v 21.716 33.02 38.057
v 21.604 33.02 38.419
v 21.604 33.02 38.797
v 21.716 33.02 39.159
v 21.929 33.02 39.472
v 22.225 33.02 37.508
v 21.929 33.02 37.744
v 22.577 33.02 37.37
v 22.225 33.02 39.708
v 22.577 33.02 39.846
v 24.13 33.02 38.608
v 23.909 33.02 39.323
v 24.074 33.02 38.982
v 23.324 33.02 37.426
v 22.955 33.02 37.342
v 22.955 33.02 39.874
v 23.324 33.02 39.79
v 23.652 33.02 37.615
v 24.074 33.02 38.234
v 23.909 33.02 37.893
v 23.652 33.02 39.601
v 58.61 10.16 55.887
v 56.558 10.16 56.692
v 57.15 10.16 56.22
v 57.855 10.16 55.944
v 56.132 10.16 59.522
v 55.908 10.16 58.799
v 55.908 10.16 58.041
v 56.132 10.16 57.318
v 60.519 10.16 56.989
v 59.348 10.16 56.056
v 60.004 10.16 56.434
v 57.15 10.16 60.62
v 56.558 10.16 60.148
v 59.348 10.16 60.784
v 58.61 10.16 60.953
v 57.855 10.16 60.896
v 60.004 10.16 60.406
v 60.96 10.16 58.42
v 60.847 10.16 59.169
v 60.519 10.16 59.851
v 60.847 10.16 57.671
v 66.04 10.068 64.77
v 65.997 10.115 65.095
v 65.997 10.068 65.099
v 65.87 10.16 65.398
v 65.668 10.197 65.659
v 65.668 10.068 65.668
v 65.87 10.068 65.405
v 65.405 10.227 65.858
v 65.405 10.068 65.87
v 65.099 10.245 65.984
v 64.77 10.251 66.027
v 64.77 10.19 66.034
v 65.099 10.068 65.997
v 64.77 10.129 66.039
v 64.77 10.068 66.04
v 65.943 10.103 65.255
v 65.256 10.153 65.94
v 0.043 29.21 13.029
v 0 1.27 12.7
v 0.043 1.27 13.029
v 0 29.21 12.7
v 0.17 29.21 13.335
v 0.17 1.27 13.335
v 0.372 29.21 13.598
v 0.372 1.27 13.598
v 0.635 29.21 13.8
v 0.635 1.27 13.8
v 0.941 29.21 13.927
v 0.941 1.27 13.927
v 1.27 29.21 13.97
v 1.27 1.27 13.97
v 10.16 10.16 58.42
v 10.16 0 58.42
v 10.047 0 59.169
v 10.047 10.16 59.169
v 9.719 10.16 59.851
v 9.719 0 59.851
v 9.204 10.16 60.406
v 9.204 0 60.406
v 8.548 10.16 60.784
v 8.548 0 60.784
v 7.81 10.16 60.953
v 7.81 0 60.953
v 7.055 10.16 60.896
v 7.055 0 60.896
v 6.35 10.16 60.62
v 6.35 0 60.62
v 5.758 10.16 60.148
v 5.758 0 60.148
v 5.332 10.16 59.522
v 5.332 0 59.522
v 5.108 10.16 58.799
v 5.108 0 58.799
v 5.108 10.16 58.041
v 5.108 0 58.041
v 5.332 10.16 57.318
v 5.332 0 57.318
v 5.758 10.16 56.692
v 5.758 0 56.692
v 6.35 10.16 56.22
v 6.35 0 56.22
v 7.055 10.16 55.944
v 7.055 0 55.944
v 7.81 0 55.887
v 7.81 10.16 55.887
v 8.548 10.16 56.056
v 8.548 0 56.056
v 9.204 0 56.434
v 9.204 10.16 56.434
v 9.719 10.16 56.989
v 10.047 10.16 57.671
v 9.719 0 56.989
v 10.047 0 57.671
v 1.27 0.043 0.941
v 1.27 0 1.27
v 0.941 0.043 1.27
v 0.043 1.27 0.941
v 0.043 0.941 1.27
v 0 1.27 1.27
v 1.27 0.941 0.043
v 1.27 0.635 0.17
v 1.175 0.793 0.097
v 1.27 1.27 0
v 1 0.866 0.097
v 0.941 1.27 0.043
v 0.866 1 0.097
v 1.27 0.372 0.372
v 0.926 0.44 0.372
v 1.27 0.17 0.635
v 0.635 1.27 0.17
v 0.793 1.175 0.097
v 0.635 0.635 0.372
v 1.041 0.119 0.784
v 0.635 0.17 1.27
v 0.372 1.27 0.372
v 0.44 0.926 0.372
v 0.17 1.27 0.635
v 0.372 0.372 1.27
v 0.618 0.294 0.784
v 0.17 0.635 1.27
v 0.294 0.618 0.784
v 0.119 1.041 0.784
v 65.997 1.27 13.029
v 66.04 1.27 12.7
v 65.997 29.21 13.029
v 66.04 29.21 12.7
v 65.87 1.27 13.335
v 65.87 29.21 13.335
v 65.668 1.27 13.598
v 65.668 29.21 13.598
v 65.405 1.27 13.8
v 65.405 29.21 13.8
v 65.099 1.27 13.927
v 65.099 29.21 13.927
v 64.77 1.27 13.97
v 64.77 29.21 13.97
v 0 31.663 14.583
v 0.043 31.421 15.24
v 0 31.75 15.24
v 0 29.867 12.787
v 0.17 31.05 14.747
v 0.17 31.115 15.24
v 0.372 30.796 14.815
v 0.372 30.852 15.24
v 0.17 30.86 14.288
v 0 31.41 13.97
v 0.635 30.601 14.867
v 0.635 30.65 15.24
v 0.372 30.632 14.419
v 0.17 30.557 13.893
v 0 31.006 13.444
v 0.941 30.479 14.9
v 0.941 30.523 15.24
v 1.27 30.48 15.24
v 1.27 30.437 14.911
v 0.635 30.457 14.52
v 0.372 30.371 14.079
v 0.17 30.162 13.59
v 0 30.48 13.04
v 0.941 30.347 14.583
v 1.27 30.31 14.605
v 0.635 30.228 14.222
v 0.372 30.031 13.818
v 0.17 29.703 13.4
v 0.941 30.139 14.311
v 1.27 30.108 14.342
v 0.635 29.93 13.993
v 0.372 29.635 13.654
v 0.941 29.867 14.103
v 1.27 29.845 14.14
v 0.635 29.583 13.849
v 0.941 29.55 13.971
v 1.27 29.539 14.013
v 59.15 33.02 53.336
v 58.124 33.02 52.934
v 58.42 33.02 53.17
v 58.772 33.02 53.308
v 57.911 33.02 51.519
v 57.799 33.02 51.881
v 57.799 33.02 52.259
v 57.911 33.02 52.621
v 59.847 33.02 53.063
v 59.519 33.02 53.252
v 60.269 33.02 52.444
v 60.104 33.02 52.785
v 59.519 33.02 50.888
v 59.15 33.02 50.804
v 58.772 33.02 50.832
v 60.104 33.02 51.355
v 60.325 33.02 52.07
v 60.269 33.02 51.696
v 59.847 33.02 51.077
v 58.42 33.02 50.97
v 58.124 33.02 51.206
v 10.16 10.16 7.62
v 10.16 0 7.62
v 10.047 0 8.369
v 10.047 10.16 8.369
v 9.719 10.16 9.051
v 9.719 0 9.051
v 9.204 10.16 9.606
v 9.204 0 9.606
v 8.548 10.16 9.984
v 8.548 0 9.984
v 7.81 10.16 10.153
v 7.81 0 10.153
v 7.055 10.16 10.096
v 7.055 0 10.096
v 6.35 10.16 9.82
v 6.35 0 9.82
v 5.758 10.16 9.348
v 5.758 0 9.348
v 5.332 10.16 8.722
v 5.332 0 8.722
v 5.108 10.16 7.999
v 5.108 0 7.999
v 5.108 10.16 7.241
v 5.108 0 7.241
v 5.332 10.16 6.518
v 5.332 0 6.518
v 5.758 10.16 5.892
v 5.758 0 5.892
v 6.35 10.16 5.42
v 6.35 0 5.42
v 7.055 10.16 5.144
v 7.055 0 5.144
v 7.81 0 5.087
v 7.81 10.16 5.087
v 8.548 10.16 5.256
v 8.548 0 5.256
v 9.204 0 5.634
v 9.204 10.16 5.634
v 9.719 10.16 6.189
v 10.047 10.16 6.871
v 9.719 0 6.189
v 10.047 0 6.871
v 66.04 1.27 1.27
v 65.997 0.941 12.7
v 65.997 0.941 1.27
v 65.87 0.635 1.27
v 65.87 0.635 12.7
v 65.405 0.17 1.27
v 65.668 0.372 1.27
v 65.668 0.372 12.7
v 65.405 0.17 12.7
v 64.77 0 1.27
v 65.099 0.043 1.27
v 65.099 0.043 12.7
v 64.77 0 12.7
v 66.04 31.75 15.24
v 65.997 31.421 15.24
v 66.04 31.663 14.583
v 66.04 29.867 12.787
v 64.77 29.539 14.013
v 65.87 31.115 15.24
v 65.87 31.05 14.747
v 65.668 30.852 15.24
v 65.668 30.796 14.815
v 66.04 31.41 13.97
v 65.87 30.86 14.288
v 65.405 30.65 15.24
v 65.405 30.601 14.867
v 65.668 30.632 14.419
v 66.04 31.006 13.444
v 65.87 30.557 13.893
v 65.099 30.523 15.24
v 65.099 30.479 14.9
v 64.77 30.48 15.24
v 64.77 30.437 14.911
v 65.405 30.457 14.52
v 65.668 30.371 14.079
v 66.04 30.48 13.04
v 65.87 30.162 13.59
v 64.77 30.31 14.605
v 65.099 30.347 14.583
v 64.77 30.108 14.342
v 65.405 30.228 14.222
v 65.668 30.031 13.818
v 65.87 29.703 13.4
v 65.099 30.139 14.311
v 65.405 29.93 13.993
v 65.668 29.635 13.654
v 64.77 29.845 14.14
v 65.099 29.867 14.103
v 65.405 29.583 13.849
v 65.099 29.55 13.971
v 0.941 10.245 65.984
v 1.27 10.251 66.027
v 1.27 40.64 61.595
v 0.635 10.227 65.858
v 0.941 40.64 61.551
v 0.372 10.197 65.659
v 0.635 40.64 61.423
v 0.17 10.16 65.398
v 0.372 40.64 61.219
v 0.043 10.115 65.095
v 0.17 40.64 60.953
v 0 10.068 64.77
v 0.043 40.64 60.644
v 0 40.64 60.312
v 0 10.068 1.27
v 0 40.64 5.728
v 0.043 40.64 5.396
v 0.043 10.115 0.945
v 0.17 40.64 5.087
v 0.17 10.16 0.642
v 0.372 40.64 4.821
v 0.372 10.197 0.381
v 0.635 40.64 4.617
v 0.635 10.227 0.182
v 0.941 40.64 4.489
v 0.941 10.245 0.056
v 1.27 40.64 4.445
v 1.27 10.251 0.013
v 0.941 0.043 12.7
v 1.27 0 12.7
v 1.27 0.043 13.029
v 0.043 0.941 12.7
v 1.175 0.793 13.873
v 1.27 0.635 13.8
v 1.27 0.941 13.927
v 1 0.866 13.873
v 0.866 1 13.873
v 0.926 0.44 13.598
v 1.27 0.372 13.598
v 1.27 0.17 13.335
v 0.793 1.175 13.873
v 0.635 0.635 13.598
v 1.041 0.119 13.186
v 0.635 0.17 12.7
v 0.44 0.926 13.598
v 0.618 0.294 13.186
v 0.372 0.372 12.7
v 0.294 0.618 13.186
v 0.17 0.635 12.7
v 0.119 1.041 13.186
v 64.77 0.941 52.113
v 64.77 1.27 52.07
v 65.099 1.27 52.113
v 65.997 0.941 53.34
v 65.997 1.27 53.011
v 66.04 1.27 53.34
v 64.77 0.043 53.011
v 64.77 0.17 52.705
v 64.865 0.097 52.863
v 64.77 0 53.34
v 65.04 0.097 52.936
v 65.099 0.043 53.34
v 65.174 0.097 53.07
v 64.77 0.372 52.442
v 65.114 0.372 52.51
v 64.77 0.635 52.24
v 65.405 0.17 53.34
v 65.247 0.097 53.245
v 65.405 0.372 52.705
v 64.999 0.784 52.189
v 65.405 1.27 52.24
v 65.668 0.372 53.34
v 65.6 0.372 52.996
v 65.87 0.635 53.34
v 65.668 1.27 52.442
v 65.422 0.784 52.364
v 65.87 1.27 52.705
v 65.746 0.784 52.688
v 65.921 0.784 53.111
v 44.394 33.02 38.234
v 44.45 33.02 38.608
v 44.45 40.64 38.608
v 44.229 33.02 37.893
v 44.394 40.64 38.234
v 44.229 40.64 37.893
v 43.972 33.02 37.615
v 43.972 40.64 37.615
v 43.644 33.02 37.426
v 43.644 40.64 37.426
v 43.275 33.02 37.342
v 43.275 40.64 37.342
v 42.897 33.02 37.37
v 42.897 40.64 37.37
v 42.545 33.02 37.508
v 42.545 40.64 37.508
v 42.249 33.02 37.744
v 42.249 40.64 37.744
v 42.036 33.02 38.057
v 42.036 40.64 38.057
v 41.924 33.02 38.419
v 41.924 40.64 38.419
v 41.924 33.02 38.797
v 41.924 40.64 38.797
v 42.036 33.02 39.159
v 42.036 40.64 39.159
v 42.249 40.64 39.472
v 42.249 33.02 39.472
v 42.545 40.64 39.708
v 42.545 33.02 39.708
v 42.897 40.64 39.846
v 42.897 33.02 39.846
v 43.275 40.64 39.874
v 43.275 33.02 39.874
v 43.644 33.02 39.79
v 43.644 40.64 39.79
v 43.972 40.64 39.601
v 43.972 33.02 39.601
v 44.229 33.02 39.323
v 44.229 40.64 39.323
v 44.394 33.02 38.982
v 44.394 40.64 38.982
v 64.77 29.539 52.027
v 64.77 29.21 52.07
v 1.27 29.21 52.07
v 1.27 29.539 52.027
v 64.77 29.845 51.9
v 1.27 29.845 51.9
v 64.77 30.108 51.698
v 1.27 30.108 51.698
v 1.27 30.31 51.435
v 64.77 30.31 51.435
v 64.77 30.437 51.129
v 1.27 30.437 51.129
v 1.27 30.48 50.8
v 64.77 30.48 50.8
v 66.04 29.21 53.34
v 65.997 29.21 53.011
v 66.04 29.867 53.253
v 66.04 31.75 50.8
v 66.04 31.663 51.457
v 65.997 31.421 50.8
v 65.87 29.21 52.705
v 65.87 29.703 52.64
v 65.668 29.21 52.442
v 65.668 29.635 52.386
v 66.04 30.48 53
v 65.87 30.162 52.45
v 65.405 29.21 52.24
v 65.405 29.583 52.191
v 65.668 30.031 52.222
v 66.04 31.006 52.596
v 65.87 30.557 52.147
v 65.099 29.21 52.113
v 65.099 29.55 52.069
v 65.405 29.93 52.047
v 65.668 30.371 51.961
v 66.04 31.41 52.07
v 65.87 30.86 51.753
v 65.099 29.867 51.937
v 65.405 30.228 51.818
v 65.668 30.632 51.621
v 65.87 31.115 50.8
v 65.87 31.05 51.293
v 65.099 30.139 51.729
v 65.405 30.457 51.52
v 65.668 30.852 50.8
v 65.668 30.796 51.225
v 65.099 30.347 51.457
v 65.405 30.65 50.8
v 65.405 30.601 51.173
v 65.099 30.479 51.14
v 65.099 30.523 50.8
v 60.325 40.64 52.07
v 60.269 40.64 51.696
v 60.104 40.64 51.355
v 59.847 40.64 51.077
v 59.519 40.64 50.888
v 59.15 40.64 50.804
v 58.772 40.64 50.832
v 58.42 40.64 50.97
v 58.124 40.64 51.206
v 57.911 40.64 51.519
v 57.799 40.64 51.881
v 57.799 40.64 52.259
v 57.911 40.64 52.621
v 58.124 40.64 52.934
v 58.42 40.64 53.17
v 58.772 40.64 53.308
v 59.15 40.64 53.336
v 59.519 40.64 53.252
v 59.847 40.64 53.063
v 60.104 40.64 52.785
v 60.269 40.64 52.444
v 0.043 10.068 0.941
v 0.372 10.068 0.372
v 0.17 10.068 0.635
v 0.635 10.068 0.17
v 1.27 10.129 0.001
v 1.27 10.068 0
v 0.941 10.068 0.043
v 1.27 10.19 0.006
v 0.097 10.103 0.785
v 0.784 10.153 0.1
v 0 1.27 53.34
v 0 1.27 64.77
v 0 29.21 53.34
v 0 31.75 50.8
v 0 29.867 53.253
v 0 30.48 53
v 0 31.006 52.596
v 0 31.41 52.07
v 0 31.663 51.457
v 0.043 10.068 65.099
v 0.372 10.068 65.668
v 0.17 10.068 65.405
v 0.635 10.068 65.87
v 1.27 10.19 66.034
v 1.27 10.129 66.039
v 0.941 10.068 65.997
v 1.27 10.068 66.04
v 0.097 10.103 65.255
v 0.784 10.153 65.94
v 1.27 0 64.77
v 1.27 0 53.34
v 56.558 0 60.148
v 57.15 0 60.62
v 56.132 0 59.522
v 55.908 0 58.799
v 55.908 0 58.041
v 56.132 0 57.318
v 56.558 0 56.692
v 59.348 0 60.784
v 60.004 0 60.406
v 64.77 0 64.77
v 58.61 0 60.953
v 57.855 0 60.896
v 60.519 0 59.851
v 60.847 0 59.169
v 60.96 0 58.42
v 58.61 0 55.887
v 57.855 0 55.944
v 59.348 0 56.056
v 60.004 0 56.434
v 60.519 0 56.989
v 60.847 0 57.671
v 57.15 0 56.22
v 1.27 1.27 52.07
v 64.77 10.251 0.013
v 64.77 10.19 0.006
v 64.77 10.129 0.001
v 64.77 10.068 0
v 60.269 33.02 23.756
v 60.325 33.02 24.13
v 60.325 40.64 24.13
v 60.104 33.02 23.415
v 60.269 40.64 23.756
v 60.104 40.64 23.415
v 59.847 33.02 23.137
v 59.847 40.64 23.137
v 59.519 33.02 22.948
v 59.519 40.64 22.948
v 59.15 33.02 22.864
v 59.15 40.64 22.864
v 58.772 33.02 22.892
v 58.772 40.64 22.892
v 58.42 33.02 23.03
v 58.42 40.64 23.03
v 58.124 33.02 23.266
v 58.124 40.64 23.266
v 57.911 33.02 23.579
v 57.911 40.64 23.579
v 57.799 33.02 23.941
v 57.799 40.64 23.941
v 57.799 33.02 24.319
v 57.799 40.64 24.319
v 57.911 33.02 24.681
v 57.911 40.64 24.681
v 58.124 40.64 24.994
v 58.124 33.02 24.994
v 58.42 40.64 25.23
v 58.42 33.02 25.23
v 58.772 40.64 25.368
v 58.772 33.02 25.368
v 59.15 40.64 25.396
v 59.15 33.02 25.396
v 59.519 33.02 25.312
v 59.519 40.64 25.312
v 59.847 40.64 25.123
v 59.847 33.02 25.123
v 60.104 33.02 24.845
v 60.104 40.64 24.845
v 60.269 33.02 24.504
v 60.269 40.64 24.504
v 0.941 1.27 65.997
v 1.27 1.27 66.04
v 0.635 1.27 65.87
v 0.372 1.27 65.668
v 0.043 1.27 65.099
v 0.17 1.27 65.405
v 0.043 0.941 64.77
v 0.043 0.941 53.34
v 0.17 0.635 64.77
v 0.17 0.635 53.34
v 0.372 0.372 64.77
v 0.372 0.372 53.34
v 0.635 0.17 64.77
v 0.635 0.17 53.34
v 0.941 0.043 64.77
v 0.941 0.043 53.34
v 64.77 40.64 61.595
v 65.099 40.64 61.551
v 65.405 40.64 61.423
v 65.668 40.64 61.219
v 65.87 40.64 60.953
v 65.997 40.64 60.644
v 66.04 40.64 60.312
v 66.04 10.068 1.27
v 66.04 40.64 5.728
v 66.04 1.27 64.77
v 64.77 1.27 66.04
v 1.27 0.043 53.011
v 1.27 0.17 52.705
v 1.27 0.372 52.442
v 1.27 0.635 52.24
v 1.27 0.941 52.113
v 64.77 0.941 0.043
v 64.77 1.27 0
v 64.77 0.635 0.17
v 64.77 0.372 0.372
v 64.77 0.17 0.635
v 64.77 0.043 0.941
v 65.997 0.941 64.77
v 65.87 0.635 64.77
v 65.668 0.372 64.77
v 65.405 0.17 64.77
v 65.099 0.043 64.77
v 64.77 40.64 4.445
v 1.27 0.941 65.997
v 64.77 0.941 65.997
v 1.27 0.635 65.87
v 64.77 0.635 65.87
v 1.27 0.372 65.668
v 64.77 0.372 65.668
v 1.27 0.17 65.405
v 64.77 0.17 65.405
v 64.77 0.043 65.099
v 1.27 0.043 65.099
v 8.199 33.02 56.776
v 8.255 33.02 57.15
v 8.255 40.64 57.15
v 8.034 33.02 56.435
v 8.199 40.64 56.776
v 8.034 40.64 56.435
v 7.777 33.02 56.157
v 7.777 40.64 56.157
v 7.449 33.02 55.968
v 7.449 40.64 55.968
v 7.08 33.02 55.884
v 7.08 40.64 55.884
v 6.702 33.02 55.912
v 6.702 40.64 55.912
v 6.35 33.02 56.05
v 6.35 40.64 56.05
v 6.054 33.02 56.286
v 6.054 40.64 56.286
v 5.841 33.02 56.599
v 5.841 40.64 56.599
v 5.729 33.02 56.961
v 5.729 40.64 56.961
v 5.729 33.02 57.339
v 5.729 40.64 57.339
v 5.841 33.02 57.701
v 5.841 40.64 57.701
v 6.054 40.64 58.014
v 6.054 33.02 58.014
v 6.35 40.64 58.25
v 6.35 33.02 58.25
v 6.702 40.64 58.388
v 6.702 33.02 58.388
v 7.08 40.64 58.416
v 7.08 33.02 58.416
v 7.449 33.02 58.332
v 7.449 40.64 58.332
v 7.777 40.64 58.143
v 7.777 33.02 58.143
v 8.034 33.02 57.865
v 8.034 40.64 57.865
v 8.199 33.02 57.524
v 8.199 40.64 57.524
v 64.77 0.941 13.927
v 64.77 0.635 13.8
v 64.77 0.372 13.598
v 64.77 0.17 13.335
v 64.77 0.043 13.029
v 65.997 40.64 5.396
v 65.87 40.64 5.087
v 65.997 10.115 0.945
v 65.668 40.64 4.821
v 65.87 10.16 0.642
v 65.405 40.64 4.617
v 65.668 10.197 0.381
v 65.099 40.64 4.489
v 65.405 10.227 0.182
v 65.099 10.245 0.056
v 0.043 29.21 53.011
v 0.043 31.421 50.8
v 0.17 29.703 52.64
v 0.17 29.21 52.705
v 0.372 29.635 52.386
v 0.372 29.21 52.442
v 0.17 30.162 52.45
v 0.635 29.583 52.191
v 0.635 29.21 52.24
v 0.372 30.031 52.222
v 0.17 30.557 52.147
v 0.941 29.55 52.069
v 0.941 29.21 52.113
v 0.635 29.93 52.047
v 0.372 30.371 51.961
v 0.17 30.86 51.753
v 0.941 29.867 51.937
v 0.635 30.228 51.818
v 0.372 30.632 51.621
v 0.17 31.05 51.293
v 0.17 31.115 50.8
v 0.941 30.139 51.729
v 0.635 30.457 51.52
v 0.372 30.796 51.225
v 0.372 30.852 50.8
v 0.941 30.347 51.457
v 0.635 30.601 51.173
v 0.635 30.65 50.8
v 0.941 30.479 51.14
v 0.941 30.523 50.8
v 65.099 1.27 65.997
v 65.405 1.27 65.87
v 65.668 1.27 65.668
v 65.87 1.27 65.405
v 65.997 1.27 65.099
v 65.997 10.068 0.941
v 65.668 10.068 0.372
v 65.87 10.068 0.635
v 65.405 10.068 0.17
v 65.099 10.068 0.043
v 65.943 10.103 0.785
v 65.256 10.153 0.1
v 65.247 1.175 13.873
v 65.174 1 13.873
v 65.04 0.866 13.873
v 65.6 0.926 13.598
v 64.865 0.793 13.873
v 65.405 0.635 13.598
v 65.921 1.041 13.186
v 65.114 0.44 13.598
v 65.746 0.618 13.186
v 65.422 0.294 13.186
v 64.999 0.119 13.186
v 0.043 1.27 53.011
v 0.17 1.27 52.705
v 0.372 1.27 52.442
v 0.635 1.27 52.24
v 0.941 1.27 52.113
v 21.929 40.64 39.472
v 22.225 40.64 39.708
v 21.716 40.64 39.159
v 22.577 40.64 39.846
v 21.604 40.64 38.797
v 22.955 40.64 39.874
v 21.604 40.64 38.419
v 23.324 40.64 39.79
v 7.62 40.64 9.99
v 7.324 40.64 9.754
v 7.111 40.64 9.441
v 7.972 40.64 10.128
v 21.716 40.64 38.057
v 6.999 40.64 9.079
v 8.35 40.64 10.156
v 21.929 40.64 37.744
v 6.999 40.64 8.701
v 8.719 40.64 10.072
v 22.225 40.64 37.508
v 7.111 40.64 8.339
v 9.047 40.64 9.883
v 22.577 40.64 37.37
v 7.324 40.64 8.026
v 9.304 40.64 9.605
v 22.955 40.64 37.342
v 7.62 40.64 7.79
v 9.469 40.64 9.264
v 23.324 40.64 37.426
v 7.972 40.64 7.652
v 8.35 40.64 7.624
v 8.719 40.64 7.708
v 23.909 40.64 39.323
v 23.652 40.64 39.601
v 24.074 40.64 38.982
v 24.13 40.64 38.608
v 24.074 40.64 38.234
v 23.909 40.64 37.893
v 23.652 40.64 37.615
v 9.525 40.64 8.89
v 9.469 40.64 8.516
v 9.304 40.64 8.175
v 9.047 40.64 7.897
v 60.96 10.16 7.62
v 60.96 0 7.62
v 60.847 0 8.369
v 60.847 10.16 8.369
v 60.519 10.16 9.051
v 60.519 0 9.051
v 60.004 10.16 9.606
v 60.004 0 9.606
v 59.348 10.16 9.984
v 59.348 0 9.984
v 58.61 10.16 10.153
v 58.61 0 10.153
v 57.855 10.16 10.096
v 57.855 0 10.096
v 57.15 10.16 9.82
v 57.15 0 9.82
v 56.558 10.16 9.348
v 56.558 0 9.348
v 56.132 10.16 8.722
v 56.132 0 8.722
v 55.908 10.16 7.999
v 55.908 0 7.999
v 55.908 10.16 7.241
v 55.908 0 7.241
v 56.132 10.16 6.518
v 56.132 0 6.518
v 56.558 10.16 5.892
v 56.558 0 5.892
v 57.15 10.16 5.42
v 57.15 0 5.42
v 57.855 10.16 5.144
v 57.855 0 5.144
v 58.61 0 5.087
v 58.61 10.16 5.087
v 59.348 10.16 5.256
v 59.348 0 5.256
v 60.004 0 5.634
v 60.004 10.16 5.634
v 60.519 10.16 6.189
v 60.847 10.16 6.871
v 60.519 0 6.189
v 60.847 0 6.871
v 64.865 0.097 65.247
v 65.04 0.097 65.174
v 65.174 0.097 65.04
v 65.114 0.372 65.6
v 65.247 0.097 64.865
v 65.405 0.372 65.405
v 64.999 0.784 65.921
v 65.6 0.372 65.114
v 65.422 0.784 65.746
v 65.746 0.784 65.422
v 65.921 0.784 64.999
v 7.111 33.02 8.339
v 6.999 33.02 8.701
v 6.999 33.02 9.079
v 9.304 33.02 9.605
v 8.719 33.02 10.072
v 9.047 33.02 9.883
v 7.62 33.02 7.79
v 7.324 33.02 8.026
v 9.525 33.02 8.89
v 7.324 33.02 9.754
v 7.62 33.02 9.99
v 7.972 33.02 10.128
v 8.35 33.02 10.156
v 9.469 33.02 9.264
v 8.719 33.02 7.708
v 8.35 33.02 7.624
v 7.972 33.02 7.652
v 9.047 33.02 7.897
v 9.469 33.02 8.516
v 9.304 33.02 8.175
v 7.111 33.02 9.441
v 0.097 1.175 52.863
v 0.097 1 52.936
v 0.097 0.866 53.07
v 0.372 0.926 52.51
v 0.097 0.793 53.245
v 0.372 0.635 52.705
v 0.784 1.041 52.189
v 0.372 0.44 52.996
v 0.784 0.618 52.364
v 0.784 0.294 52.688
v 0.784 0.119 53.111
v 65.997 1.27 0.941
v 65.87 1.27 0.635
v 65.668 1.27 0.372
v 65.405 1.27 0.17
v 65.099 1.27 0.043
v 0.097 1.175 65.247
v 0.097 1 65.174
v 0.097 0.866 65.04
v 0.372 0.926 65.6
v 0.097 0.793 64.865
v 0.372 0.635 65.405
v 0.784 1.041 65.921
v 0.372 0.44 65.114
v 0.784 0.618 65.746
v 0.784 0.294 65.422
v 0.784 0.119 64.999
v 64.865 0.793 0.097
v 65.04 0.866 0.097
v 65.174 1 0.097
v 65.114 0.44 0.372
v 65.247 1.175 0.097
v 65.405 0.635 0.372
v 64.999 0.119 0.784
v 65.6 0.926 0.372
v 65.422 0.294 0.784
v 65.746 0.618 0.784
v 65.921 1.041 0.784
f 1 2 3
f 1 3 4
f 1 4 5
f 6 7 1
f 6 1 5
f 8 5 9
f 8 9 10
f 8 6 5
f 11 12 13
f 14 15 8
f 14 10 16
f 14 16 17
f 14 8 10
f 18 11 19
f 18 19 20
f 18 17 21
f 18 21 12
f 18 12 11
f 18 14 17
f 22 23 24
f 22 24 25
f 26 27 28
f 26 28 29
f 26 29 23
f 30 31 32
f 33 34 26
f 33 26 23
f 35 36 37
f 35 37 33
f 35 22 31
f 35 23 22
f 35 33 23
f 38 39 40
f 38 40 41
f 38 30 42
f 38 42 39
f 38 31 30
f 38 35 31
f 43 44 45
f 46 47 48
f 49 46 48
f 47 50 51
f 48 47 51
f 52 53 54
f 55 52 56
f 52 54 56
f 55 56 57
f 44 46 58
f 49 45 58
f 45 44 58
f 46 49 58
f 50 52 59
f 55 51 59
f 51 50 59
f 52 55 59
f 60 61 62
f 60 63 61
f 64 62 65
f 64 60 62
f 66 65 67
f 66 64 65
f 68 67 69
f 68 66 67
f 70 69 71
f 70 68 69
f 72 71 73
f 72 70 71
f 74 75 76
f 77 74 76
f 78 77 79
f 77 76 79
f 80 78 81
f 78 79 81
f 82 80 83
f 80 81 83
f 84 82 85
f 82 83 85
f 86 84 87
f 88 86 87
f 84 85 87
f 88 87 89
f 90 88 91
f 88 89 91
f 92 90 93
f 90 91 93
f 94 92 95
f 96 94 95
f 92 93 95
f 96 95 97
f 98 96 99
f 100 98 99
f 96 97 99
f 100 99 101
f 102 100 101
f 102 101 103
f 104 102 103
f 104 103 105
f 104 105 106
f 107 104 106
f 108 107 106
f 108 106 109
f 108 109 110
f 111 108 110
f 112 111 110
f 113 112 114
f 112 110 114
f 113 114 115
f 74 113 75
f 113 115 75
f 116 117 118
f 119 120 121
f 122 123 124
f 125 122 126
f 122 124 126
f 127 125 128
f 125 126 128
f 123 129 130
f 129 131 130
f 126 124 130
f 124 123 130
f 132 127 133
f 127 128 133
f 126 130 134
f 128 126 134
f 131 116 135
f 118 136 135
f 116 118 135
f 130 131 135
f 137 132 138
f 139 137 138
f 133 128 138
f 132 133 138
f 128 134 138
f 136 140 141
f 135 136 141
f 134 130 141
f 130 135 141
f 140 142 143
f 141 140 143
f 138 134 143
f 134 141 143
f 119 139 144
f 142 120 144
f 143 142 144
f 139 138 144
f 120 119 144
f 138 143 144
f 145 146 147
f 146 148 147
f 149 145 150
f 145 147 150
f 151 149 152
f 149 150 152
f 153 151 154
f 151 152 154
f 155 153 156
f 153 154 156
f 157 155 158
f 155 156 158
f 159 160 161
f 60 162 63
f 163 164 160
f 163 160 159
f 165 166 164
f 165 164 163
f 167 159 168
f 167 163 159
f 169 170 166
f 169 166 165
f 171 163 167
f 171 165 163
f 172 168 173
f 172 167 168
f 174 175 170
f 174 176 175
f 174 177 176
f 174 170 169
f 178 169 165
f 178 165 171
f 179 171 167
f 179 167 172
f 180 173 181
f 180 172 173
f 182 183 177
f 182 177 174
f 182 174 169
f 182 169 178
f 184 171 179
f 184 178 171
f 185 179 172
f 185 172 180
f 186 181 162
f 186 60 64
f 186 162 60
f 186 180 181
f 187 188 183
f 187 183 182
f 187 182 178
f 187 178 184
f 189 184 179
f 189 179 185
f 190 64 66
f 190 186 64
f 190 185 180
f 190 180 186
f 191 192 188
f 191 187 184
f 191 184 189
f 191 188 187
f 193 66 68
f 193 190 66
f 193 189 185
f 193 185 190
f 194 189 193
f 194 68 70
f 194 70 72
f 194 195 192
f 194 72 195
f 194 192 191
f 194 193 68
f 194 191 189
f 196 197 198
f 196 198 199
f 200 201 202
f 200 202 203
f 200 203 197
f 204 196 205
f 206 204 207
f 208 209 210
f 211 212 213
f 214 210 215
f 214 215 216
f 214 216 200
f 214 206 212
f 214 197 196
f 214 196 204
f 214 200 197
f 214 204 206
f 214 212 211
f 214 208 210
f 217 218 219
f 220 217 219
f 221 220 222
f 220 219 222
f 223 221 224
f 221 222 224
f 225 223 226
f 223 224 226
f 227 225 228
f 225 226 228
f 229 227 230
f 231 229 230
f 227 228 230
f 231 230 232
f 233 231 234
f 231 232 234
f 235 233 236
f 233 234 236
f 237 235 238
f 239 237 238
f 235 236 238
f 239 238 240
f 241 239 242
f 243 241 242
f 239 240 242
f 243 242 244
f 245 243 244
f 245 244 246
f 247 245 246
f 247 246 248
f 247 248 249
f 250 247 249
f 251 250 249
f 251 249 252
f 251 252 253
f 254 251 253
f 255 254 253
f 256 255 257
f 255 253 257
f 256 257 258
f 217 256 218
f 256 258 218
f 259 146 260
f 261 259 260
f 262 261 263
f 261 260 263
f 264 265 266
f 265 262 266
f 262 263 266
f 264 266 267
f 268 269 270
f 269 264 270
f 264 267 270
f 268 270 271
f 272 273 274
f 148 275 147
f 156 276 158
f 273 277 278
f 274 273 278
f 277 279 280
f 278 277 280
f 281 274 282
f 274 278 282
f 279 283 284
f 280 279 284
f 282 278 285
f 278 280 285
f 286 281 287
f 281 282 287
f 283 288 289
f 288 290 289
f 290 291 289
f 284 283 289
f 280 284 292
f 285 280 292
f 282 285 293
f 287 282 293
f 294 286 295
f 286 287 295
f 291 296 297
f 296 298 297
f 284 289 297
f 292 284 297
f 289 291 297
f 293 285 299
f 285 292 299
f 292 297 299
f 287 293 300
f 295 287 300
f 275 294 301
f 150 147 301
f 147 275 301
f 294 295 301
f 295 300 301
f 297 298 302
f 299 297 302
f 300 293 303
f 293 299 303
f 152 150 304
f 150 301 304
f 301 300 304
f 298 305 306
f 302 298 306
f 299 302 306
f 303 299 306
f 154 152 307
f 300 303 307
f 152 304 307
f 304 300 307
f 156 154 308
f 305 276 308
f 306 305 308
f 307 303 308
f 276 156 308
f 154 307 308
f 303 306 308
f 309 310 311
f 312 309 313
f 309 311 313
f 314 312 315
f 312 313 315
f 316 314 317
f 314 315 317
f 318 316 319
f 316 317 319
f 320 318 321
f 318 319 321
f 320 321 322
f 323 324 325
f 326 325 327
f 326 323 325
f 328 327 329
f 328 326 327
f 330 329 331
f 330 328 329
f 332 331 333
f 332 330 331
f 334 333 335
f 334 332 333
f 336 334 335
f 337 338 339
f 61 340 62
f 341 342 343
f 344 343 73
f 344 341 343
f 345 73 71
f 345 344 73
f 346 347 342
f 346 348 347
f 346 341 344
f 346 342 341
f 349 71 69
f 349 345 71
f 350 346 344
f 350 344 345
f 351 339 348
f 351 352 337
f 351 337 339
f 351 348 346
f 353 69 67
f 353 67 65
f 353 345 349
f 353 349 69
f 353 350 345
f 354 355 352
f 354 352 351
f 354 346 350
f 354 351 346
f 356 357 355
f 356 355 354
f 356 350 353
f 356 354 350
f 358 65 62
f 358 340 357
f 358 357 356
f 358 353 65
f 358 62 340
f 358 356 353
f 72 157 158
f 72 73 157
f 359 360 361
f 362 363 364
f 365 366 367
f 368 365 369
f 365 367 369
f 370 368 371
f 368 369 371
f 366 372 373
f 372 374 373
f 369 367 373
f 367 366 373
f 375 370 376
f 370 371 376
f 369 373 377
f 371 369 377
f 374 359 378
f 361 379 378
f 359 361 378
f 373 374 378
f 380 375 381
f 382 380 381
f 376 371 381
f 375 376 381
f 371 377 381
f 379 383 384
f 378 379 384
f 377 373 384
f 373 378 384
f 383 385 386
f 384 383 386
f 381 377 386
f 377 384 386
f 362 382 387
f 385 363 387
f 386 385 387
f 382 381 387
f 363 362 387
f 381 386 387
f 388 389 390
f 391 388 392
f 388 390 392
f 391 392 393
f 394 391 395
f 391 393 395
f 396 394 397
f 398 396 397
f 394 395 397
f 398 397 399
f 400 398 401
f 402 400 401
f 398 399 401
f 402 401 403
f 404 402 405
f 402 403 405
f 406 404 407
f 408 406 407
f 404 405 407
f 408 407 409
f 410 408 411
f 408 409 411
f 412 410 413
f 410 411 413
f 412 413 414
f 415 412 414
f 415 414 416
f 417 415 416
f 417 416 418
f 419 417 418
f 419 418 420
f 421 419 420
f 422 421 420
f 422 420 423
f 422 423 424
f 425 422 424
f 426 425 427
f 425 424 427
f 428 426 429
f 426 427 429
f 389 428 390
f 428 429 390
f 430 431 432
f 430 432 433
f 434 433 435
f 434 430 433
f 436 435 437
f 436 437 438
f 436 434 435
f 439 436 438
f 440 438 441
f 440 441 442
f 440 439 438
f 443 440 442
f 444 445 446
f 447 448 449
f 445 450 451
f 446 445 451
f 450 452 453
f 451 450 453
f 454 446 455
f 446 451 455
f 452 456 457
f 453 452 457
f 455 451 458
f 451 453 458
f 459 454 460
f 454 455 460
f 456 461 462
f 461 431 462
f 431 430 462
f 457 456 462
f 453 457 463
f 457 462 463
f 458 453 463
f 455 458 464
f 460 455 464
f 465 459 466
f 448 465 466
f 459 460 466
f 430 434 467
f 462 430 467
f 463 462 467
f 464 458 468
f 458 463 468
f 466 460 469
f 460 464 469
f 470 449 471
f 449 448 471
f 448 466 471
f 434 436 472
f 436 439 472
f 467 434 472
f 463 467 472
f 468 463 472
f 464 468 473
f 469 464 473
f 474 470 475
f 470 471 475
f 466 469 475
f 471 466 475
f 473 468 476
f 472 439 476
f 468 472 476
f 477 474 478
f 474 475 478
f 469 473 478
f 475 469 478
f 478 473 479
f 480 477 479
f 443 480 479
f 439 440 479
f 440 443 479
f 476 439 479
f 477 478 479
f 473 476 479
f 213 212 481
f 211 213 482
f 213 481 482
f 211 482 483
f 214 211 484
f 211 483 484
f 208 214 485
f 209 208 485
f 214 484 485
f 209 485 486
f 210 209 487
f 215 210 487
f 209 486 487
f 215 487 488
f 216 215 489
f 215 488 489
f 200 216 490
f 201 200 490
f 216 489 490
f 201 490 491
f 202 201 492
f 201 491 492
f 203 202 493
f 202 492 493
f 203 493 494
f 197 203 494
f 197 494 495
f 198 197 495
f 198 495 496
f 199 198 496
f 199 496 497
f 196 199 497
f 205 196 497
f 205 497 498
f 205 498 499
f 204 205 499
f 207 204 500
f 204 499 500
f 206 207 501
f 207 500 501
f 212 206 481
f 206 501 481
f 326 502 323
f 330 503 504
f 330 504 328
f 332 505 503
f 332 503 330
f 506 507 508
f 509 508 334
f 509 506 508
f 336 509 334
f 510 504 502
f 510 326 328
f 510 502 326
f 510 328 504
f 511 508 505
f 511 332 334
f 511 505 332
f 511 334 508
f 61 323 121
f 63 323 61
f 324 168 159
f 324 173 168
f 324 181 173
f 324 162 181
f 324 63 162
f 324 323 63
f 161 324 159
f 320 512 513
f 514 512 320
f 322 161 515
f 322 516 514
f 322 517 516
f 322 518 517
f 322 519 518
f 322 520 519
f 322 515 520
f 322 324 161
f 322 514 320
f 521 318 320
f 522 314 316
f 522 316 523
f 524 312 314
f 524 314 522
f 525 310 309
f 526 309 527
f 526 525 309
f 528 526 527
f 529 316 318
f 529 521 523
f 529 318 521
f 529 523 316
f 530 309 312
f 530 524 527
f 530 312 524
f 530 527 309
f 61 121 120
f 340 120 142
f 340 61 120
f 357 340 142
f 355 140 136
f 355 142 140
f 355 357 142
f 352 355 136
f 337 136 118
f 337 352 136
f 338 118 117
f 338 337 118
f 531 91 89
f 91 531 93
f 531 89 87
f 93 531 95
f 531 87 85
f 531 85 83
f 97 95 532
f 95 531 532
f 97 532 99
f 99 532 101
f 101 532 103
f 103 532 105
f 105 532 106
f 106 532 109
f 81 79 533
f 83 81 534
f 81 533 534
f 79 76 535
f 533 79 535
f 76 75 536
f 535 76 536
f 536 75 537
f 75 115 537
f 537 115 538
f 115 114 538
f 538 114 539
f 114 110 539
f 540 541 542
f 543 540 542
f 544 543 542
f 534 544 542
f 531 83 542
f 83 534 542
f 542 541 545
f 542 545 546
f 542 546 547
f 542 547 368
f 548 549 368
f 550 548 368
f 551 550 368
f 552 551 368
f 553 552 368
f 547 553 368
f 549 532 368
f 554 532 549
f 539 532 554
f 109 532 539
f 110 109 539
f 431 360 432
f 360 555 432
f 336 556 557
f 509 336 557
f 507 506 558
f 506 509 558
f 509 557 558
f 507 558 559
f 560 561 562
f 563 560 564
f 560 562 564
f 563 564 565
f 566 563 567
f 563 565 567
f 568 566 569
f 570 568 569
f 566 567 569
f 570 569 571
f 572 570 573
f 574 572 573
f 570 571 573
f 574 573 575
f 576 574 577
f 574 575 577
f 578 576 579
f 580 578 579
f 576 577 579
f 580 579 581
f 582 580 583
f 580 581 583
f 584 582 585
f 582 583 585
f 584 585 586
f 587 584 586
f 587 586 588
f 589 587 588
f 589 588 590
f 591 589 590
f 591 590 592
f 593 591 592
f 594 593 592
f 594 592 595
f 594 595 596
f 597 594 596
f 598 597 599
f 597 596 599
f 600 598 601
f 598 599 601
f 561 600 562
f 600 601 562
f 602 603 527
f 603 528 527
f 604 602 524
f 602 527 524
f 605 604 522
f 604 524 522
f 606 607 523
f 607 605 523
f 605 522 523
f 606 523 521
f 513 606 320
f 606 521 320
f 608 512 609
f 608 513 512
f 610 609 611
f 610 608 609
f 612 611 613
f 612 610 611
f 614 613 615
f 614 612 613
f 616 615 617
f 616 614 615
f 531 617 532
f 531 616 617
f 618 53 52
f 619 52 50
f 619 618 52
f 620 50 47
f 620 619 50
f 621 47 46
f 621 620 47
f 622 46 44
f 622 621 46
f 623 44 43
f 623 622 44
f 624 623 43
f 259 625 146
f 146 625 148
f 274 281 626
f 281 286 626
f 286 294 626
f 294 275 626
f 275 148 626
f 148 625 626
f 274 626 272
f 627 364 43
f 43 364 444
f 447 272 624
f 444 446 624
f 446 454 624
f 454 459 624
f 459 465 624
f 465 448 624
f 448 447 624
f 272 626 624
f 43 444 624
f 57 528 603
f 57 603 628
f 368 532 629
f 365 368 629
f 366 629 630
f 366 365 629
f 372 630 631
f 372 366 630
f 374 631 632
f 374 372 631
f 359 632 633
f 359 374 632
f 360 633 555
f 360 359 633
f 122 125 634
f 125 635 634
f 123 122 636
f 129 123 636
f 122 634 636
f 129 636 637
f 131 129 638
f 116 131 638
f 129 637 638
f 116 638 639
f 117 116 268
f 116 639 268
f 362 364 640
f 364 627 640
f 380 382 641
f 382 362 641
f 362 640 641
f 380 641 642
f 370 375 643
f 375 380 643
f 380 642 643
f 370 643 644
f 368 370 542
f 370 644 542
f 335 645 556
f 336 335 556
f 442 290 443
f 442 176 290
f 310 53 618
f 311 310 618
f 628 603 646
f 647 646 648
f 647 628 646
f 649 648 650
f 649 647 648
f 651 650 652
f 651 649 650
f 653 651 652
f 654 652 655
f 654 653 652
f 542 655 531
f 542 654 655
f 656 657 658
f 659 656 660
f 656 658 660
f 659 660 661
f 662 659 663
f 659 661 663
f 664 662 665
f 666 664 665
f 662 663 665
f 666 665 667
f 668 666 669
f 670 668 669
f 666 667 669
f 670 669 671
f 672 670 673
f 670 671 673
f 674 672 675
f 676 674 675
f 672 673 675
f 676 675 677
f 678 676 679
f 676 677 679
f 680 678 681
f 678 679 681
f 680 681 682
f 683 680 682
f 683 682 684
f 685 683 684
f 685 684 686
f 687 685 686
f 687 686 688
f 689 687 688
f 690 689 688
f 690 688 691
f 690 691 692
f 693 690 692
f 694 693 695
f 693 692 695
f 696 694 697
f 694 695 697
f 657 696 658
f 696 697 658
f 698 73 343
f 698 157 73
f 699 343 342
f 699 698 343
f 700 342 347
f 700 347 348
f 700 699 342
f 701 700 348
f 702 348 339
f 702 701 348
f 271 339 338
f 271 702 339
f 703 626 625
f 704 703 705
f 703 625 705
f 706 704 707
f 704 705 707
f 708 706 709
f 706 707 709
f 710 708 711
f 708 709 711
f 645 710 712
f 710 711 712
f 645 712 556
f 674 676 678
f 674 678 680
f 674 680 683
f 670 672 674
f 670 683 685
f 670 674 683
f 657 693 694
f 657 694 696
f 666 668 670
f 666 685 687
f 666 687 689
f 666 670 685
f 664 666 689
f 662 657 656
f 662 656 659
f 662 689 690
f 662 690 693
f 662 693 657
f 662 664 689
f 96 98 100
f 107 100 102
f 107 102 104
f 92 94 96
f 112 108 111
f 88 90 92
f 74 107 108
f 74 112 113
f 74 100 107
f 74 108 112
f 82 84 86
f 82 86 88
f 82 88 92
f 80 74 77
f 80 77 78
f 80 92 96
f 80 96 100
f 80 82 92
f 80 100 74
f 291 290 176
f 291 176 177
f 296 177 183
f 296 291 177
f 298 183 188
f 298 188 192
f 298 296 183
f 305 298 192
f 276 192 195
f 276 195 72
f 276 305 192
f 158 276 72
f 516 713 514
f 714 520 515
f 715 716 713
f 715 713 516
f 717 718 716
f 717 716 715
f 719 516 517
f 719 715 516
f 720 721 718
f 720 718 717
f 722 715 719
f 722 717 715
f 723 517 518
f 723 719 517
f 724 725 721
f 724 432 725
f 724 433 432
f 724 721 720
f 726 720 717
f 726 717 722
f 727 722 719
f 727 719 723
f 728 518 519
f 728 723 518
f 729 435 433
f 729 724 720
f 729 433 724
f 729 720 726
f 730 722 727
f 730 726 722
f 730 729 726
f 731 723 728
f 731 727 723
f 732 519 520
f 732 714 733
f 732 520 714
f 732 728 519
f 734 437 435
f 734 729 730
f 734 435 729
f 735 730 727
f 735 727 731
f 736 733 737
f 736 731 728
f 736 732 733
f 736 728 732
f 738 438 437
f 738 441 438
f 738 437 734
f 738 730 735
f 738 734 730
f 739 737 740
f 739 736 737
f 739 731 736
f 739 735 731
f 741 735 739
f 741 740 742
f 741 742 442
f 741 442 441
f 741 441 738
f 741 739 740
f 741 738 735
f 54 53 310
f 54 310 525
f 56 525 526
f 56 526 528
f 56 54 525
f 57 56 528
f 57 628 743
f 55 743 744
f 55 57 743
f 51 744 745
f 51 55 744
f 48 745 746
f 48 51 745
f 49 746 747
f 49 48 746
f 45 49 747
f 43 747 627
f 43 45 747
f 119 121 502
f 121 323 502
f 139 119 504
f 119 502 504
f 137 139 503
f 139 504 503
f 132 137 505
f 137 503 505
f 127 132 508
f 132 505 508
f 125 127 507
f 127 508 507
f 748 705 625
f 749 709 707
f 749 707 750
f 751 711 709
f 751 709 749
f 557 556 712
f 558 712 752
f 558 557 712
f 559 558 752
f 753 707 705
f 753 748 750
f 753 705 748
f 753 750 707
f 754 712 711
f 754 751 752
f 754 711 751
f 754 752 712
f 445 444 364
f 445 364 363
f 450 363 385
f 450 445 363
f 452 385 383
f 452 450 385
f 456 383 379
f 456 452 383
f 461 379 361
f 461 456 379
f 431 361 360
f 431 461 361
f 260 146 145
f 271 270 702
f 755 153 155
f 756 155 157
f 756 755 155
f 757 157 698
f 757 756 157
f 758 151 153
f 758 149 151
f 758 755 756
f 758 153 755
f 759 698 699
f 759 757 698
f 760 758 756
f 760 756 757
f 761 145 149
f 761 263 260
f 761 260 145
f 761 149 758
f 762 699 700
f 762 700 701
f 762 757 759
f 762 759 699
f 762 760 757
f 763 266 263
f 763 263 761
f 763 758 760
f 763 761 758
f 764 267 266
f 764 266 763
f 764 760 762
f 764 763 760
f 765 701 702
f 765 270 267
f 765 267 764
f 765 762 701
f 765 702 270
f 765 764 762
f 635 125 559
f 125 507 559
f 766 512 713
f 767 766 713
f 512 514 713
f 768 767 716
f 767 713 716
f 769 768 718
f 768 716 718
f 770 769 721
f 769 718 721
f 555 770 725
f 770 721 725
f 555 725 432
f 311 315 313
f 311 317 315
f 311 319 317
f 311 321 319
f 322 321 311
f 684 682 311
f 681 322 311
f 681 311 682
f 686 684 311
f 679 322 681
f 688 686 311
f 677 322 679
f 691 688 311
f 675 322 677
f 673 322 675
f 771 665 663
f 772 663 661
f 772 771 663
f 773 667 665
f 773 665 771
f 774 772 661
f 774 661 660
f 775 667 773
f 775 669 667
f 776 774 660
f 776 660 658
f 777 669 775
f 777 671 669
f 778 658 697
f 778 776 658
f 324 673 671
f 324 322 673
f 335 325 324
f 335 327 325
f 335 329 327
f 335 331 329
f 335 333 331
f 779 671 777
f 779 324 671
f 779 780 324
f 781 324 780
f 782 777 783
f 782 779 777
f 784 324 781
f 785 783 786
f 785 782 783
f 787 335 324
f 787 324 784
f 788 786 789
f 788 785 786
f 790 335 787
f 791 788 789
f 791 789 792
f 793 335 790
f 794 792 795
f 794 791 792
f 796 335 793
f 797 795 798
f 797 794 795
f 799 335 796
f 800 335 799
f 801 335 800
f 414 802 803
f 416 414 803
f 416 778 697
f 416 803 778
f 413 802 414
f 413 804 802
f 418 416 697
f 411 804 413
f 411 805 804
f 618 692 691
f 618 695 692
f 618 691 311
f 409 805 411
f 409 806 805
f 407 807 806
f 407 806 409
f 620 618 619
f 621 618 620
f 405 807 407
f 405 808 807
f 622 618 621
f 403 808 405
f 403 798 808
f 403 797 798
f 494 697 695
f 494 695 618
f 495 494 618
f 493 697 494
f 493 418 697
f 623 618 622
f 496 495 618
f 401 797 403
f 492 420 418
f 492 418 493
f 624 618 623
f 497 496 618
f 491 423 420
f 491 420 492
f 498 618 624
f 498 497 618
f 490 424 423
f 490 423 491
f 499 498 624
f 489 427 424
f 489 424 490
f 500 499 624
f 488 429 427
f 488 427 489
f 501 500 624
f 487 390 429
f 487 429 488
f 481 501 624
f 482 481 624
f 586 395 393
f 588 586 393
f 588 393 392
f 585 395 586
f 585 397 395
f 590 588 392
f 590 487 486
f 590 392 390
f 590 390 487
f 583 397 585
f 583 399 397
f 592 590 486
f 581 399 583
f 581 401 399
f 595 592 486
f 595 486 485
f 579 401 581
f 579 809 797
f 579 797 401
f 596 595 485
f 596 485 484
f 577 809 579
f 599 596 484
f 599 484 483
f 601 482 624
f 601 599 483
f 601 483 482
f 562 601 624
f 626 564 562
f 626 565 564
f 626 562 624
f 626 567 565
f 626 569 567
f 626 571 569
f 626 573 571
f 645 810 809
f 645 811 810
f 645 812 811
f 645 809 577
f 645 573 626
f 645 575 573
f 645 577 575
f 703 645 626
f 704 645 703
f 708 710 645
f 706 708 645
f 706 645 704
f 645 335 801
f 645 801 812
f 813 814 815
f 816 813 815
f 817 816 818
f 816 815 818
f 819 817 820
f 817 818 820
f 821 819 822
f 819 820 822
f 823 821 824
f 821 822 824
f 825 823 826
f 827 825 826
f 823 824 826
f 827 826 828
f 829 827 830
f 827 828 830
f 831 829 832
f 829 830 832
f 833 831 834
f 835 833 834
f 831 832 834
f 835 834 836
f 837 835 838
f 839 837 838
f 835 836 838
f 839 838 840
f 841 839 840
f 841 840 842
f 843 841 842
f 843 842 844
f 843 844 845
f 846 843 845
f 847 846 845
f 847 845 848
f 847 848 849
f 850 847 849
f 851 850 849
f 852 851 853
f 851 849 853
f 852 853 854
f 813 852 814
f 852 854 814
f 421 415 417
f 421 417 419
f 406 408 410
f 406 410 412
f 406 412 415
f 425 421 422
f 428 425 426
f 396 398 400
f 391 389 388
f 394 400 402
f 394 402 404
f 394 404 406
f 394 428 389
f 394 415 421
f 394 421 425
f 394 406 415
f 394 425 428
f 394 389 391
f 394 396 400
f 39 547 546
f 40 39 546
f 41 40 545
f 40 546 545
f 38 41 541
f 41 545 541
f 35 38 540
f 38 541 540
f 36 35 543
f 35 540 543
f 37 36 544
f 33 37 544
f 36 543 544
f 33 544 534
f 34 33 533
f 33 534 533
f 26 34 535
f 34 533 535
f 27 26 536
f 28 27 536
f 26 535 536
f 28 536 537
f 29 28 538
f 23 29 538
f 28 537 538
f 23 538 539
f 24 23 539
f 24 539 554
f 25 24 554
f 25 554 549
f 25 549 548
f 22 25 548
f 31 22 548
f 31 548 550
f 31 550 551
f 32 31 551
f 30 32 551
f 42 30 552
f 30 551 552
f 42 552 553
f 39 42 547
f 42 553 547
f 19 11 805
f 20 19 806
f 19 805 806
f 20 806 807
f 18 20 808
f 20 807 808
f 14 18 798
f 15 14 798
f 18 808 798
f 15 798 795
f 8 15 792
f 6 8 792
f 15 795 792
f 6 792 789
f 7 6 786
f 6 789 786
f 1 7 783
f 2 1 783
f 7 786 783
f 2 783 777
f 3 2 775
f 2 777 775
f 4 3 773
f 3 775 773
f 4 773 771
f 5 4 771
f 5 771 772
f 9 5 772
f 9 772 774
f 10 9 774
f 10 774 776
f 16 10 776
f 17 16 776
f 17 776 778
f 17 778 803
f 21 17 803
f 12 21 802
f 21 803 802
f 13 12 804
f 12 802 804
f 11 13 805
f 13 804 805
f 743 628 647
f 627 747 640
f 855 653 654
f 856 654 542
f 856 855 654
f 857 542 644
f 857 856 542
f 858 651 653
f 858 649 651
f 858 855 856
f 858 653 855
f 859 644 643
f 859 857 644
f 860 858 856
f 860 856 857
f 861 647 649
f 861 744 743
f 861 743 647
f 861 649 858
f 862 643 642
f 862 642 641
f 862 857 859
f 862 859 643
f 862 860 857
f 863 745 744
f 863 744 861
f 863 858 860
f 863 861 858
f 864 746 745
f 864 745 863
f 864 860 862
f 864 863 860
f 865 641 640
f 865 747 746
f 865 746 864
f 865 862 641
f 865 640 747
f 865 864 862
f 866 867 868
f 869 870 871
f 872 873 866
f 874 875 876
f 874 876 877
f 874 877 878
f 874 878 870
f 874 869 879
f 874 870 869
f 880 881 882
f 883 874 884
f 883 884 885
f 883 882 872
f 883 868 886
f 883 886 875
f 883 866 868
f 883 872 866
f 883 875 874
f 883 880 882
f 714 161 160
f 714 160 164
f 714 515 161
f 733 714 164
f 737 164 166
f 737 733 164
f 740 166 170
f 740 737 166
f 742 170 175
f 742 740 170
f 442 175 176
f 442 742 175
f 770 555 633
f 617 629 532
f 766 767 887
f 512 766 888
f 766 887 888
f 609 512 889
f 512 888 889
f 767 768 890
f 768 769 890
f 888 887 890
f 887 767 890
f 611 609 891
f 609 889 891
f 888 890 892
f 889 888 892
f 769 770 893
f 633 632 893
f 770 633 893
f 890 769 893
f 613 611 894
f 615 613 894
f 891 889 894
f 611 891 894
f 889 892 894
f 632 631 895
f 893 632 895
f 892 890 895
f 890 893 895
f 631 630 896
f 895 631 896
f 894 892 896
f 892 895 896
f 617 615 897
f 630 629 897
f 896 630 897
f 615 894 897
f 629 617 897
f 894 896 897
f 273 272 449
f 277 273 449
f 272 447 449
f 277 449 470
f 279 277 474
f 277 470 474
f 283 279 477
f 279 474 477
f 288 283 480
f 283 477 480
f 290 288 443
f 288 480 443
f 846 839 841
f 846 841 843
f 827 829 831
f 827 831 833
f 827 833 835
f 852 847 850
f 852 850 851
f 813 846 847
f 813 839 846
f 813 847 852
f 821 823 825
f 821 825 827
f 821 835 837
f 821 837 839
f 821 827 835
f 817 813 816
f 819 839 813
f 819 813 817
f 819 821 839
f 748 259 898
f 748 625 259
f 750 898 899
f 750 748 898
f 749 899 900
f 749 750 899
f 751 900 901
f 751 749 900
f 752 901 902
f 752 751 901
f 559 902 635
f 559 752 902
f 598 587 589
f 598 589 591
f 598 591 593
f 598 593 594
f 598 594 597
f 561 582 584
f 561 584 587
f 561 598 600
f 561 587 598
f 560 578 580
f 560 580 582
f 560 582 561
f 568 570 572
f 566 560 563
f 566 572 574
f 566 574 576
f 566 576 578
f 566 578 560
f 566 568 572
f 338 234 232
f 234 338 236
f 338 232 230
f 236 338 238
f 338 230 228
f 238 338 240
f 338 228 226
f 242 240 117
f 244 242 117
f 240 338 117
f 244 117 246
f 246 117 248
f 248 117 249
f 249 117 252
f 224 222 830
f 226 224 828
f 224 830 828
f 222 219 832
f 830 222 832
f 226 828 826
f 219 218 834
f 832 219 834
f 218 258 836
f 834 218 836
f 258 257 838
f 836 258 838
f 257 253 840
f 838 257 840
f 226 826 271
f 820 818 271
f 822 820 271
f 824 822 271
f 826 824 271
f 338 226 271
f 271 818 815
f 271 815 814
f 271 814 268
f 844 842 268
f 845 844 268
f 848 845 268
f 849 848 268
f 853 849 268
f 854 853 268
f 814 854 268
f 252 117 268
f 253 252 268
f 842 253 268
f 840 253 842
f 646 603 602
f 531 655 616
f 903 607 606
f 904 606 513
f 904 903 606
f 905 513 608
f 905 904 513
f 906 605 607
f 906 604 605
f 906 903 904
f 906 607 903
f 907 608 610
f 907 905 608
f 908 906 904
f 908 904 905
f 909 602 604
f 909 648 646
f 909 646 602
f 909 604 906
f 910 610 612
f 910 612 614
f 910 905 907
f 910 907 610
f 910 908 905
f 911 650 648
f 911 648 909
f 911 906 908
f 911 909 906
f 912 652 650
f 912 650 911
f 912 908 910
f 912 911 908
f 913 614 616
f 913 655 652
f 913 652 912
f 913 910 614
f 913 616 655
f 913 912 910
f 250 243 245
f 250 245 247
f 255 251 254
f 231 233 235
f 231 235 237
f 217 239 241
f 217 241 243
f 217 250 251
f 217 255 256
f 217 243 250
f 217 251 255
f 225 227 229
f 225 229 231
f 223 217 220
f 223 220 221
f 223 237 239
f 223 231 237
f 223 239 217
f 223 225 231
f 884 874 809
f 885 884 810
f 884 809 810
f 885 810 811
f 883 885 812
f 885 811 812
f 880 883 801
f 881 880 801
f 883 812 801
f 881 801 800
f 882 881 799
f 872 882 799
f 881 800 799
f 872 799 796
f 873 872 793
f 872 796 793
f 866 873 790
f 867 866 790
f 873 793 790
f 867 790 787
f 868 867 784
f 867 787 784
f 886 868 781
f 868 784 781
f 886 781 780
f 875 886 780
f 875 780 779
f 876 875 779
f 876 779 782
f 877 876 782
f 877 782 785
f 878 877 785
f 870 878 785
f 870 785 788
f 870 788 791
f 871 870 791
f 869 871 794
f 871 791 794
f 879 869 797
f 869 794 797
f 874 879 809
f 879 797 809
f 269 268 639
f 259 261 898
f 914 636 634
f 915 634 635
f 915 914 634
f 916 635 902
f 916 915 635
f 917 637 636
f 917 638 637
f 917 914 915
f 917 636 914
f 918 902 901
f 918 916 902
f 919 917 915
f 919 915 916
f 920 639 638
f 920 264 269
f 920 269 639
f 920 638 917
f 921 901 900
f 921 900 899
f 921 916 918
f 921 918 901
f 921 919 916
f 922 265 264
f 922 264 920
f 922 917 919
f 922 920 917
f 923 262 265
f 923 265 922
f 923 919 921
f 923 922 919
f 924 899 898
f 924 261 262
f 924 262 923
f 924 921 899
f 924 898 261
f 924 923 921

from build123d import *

# Parameters (mm, degrees)
SKETCH1_W           = 66.04
SKETCH1_H           = 10.16
BOSS_EXTRUDE1_DEPTH = 66.04
SKETCH5_W           = 66.04
SKETCH5_H           = 57.15
BOSS_EXTRUDE2_DEPTH = 30.48
SKETCH6_W           = 38.1
SKETCH6_H           = 30.48
CUT_EXTRUDE4_DEPTH  = 67.04
SKETCH7_R           = 1.27
CUT_EXTRUDE5_DEPTH  = 7.62
BOSS_EXTRUDE3_DEPTH = 66.04
FILLET1_R           = 1.27
SKETCH9_R           = 2.54
CUT_EXTRUDE6_DEPTH  = 10.16


with BuildPart() as part:
    # Sketch1 → Boss-Extrude1 (new body)
    with BuildSketch(Plane.XY):
        with Locations((33.02, 5.08)):
            Rectangle(SKETCH1_W, SKETCH1_H)
    extrude(amount=BOSS_EXTRUDE1_DEPTH)

    # Sketch5 → Boss-Extrude2 (add)
    with BuildSketch(Plane(origin=(0, 10.16, 0), x_dir=(1, 0, 0), z_dir=(0, 1, 0))):
        with Locations((33.02, -33.02)):
            Rectangle(SKETCH5_W, SKETCH5_H)
    extrude(amount=BOSS_EXTRUDE2_DEPTH)

    # Sketch6 → Cut-Extrude4 (cut, through all)
    with BuildSketch(Plane.ZY):
        with Locations((33.02, 15.24)):
            Rectangle(SKETCH6_W, SKETCH6_H)
    extrude(amount=-CUT_EXTRUDE4_DEPTH, mode=Mode.SUBTRACT)

    # Sketch7 → Cut-Extrude5 (cut)
    with BuildSketch(Plane(origin=(0, 40.64, 0), x_dir=(1, 0, 0), z_dir=(0, 1, 0))):
        with Locations((6.985, -57.15)):
            Circle(SKETCH7_R)
        with Locations((8.255, -8.89)):
            Circle(SKETCH7_R)
        with Locations((59.055, -24.13)):
            Circle(SKETCH7_R)
        with Locations((59.055, -52.07)):
            Circle(SKETCH7_R)
        with Locations((43.18, -38.608)):
            Circle(SKETCH7_R)
        with Locations((22.86, -38.608)):
            Circle(SKETCH7_R)
    extrude(amount=-CUT_EXTRUDE5_DEPTH, mode=Mode.SUBTRACT)

    # Sketch8 → Boss-Extrude3 (add)
    with BuildSketch(Plane(origin=(66.04, 0, 0), x_dir=(0, 0, -1), z_dir=(1, 0, 0))):
        Polygon((-61.595, 10.16), (-66.04, 10.16), (-61.595, 40.64), align=None)
        Polygon((-4.445, 10.16), (-4.445, 40.64), (0, 10.16), align=None)
    extrude(amount=-BOSS_EXTRUDE3_DEPTH)

    # Fillet1
    fillet1_edges = [part.edges().sort_by_distance(p)[0] for p in [
        (66.04, 5.08, 66.04),
        (33.02, 0, 66.04),
        (66.04, 0, 6.985),
        (66.04, 15.24, 52.07),
        (66.04, 30.48, 33.02),
        (66.04, 15.24, 13.97),
        (0, 0, 6.985),
        (33.02, 0, 52.07),
        (33.02, 0, 13.97),
        (0, 15.24, 13.97),
        (33.02, 30.48, 13.97),
        (0, 30.48, 33.02),
        (33.02, 30.48, 52.07),
        (0, 15.24, 52.07),
        (0, 5.08, 66.04),
        (33.02, 0, 0),
        (66.04, 5.08, 0),
        (33.02, 10.16, 0),
        (0, 5.08, 0),
        (33.02, 10.16, 66.04),
        (66.04, 25.4, 63.8175),
        (0, 25.4, 63.8175),
        (0, 0, 59.055),
        (66.04, 0, 59.055),
        (66.04, 25.4, 2.2225),
        (0, 25.4, 2.2225),
    ]]
    fillet(fillet1_edges, radius=FILLET1_R)

    # Sketch9 → Cut-Extrude6 (cut)
    with BuildSketch(Plane.XZ):
        with Locations((58.42, 58.42)):
            Circle(SKETCH9_R)
        with Locations((7.62, 58.42)):
            Circle(SKETCH9_R)
        with Locations((7.62, 7.62)):
            Circle(SKETCH9_R)
        with Locations((58.42, 7.62)):
            Circle(SKETCH9_R)
    extrude(amount=-CUT_EXTRUDE6_DEPTH, mode=Mode.SUBTRACT)


solid = part.part
